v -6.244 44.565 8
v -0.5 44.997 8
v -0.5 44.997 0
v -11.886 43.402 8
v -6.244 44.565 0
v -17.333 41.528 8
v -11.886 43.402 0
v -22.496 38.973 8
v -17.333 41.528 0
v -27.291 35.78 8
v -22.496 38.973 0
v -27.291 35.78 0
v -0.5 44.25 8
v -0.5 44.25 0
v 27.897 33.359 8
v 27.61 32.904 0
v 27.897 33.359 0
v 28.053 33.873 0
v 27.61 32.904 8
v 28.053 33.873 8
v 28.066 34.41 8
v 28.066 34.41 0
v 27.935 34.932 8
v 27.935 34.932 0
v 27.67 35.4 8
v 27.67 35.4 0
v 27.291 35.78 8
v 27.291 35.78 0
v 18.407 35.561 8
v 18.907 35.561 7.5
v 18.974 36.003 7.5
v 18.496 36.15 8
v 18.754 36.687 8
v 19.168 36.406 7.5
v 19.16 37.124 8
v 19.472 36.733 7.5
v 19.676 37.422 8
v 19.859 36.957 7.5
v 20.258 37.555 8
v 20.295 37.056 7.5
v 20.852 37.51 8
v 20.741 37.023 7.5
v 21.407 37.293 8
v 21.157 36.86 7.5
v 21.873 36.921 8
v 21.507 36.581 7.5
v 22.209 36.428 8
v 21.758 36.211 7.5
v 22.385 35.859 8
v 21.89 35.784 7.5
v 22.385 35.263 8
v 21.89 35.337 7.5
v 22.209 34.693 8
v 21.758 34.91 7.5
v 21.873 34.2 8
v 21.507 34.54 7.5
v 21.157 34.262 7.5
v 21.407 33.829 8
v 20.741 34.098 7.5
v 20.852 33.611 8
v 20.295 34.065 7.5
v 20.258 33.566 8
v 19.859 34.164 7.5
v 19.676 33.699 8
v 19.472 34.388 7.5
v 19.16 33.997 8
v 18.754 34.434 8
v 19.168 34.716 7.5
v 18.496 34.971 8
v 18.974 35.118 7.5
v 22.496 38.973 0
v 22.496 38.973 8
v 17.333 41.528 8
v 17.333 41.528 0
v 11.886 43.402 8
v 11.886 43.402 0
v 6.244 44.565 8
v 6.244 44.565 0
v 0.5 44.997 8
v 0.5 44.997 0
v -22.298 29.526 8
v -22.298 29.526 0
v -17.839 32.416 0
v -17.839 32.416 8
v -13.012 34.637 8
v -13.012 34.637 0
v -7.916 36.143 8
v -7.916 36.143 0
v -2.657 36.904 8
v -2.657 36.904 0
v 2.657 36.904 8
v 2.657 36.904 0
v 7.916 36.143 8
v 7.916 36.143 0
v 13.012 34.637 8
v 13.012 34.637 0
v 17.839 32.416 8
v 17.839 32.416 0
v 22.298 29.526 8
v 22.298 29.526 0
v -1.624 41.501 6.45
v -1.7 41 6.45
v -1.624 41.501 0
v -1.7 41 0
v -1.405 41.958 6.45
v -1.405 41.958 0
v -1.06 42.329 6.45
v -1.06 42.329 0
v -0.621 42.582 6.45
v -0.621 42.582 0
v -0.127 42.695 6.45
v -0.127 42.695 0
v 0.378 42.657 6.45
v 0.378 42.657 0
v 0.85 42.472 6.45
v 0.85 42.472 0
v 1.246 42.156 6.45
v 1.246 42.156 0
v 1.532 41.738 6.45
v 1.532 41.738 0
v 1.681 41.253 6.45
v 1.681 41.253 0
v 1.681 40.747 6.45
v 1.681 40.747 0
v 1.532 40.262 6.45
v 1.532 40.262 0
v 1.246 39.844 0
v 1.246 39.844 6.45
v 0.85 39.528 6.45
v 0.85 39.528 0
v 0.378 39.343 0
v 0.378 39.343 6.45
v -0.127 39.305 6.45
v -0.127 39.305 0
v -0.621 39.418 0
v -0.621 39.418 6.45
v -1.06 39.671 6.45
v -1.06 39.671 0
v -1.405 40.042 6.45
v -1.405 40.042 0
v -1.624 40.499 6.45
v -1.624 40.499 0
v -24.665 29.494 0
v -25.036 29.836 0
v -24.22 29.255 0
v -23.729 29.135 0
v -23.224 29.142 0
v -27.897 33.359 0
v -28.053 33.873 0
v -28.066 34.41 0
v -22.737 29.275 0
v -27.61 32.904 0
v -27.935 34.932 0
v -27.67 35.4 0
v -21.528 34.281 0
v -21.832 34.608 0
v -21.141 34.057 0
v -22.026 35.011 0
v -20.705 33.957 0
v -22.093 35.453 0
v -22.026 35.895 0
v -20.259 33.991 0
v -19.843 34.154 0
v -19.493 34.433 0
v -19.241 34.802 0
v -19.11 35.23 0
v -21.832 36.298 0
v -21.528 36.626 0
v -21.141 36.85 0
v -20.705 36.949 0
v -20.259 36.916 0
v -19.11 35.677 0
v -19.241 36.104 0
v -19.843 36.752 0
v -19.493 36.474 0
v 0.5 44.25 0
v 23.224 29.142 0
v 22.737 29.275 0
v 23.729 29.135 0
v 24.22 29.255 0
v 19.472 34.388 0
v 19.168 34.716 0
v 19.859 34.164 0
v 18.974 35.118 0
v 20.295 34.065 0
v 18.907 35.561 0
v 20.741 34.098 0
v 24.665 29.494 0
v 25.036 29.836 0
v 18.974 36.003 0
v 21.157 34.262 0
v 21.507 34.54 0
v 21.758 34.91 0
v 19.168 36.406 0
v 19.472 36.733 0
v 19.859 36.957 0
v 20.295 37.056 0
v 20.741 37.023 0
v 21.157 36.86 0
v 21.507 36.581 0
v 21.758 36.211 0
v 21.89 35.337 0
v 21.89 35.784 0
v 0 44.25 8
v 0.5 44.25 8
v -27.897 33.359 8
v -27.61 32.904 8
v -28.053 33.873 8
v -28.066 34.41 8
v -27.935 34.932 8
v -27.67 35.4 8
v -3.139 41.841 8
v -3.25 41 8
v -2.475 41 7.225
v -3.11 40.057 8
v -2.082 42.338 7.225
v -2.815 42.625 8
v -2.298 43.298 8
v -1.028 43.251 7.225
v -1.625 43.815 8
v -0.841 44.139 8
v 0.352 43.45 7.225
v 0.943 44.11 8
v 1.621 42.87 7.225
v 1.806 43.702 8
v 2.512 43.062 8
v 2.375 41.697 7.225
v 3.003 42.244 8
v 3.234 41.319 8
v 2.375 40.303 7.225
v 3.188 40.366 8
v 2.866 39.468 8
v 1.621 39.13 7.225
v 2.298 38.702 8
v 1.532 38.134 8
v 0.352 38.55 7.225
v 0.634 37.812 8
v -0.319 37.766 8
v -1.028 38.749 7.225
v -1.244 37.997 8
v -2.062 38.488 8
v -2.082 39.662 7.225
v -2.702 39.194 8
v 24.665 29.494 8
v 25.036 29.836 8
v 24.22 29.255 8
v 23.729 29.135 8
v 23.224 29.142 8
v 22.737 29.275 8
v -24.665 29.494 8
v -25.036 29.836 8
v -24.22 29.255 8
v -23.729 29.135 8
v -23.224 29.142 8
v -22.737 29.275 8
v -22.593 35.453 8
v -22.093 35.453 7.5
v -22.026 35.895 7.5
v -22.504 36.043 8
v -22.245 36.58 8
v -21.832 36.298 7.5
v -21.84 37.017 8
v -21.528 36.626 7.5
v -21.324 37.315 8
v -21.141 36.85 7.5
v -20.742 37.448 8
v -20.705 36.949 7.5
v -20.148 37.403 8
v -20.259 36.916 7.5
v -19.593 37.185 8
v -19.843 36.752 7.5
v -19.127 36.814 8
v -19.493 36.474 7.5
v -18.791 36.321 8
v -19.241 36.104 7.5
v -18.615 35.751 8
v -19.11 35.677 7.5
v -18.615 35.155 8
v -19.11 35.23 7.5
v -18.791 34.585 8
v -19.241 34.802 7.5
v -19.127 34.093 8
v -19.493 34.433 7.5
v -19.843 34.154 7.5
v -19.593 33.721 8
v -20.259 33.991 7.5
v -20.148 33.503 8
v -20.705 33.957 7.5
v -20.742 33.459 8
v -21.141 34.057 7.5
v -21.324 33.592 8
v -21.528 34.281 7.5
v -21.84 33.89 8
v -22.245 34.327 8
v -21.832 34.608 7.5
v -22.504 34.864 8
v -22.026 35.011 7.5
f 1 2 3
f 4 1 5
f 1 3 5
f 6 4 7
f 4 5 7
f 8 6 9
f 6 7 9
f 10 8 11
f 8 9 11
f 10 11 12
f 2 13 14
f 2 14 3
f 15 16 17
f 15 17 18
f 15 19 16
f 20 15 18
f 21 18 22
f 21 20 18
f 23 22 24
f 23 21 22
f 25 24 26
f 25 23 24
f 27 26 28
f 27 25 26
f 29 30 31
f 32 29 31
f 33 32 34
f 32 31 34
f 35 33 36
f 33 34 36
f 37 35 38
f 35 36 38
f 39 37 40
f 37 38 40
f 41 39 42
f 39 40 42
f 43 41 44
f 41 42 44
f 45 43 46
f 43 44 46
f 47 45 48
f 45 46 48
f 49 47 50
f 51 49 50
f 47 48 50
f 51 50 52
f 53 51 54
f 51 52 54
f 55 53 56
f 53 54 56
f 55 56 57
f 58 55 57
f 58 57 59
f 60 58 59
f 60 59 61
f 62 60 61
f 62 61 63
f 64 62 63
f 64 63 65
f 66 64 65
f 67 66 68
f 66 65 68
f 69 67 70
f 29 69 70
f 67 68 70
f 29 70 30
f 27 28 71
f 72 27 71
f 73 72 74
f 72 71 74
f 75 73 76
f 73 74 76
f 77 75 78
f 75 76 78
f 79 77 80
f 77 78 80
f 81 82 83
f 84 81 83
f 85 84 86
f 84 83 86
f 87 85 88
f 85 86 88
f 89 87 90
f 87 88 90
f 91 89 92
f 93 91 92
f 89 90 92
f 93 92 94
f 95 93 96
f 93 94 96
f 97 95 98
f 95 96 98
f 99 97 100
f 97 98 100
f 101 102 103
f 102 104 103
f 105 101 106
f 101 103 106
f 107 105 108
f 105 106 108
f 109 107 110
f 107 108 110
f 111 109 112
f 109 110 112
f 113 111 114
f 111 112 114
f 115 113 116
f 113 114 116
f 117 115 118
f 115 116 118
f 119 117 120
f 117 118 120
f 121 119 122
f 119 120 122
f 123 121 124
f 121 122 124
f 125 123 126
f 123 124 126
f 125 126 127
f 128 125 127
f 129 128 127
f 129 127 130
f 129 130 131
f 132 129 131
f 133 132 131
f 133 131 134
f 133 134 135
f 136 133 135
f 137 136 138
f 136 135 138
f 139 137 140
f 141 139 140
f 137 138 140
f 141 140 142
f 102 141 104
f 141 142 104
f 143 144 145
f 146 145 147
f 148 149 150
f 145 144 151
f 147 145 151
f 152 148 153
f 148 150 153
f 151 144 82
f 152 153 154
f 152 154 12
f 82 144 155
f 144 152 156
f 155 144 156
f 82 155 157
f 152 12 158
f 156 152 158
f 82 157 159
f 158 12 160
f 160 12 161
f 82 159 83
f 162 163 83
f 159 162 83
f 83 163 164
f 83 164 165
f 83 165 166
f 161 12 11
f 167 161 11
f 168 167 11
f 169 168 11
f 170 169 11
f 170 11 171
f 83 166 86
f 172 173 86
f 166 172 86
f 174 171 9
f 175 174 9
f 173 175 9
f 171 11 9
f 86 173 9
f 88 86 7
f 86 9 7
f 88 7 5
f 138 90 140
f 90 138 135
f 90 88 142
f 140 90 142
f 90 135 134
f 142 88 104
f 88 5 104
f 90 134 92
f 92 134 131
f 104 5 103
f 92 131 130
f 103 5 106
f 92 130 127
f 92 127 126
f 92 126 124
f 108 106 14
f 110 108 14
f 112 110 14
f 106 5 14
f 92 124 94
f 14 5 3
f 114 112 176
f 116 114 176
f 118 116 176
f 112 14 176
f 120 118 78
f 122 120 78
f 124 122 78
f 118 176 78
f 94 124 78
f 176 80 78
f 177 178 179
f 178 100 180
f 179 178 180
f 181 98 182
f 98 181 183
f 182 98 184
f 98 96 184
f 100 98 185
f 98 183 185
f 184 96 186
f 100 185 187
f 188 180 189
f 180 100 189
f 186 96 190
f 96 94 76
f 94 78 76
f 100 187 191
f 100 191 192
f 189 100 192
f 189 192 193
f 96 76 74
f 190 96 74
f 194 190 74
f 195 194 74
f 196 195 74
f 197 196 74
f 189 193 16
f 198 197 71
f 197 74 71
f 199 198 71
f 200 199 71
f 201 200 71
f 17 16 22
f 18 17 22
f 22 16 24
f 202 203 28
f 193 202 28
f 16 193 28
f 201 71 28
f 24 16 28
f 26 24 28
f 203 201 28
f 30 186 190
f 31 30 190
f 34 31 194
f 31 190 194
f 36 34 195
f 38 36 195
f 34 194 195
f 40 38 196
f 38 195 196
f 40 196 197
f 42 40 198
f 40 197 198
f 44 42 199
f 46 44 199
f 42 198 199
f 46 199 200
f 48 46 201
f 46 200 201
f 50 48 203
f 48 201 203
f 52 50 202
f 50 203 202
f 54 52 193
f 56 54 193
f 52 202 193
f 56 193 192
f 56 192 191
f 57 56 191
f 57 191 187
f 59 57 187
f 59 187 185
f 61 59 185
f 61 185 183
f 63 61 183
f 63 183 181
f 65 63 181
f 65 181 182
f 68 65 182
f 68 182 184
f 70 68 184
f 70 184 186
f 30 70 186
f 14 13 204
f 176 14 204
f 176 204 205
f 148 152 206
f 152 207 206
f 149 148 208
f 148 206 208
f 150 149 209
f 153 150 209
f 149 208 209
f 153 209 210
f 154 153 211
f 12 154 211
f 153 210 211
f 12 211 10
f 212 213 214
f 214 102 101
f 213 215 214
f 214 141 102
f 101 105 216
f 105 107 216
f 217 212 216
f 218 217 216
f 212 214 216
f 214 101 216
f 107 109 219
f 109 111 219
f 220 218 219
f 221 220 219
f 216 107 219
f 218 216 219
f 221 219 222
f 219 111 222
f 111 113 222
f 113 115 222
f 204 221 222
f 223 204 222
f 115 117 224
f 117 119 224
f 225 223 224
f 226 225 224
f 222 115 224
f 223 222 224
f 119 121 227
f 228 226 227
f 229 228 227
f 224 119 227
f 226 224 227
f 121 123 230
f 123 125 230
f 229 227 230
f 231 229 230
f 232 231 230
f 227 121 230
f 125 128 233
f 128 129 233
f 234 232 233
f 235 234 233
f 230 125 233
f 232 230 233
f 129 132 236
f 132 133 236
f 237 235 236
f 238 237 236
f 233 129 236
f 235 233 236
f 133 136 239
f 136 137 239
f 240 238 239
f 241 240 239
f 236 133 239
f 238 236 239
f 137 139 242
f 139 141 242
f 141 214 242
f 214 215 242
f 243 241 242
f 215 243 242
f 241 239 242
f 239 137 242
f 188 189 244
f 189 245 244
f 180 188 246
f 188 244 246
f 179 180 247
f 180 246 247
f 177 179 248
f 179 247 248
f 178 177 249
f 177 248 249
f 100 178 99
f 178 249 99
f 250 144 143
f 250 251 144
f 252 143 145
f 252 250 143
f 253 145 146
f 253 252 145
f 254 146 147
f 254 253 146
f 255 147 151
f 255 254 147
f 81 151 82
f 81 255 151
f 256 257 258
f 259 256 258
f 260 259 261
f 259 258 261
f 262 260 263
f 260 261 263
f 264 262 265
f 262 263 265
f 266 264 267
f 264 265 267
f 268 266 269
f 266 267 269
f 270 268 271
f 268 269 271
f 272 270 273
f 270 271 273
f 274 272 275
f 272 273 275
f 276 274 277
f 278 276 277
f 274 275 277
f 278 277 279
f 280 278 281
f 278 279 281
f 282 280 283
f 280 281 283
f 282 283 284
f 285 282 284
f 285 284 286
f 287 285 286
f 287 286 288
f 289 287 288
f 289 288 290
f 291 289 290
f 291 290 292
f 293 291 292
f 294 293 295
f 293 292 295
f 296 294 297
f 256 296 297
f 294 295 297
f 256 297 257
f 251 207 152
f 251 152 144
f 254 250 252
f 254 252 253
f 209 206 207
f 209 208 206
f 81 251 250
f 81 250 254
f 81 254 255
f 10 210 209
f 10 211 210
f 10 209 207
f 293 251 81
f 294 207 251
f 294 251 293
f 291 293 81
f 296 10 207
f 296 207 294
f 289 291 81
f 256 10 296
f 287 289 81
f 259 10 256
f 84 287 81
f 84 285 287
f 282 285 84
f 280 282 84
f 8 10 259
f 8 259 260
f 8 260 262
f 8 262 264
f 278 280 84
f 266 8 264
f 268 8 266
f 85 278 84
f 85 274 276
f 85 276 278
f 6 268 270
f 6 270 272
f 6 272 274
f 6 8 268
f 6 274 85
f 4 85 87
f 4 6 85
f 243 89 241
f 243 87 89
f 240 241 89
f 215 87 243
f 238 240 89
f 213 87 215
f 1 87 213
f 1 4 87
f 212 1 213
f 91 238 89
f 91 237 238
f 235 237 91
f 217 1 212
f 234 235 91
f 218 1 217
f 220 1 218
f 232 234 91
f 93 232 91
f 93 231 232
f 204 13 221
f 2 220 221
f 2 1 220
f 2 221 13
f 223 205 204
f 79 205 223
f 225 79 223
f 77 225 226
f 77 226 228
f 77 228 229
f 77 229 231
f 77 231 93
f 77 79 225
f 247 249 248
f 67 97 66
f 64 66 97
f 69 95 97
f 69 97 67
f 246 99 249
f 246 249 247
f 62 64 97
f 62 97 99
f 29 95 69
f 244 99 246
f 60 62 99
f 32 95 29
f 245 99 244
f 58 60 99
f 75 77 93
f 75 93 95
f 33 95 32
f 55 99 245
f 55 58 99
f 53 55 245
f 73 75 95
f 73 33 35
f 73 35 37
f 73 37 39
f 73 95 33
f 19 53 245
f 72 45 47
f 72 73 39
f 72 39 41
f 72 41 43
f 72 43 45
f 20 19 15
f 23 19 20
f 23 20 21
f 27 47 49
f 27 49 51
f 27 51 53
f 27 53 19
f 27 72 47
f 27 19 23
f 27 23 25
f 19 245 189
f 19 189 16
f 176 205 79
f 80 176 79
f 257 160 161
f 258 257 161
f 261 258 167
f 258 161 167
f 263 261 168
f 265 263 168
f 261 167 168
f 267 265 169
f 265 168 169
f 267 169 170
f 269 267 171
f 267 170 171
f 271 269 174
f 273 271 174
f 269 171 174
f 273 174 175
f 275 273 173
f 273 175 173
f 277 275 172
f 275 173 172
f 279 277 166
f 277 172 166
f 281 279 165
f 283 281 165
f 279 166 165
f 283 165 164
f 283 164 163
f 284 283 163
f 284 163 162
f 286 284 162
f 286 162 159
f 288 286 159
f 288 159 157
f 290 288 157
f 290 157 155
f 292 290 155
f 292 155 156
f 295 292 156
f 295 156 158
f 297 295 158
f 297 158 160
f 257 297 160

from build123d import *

# Parameters (mm, degrees)
EXTRUDE_1_DEPTH           = 8
HOLE_WIZARD_1_D           = 3.4
HOLE_WIZARD_1_DEPTH       = 10
HOLE_WIZARD_1_CSINK_D     = 6.5
HOLE_WIZARD_1_CSINK_ANGLE = 90
HOLE_WIZARD_1_TIP         = 1.021463052
FILLET_1_R                = 2
MM_2_D                    = 3
CHAMFER_1_SIZE            = 0.5
SKETCH_7_W                = 1
SKETCH_7_H                = 1.5
CUT_EXTRUDE_1_DEPTH       = 54.641089712


with BuildPart() as part:
    # 草图1 → 凸台-拉伸1 (new body)
    with BuildSketch(Plane.XY):
        with BuildLine():
            Line((-28.925442436, 34.47199994), (-23.783141558, 28.343644395))
            ThreePointArc((-23.783141558, 28.343644395), (0, 37), (23.783141558, 28.343644395))
            Line((23.783141558, 28.343644395), (28.925442436, 34.47199994))
            ThreePointArc((28.925442436, 34.47199994), (0, 45), (-28.925442436, 34.47199994))
        make_face()
    extrude(amount=EXTRUDE_1_DEPTH)

    # 打孔尺寸(%根据)内六角花形半沉头螺钉的类型1
    with Locations(Plane.XY.offset(8)):
        with Locations((0, 41)):
            CounterSinkHole(HOLE_WIZARD_1_D / 2, HOLE_WIZARD_1_CSINK_D / 2, depth=HOLE_WIZARD_1_DEPTH, counter_sink_angle=HOLE_WIZARD_1_CSINK_ANGLE)
            with Locations((0, 0, -(HOLE_WIZARD_1_DEPTH + HOLE_WIZARD_1_TIP / 2))):  # 118° drill point
                Cone(0, HOLE_WIZARD_1_D / 2, HOLE_WIZARD_1_TIP, mode=Mode.SUBTRACT)

    # 圆角1
    fillet_1_edges = [part.edges().sort_by_distance(p)[0] for p in [
        (-23.783141558, 28.343644395, 4),
        (-28.925442436, 34.47199994, 4),
        (28.925442436, 34.47199994, 4),
        (23.783141558, 28.343644395, 4),
    ]]
    fillet(fillet_1_edges, radius=FILLET_1_R)

    # 大小mm 暗销孔2 (through all)
    with Locations(Plane.XY.offset(8)):
        with Locations((20.406972636, 35.560588688), (-20.592886859, 35.453251061)):
            Hole(MM_2_D / 2)

    # 倒角1
    chamfer_1_edges = [part.edges().sort_by_distance(p)[0] for p in [
        (21.906972636, 35.560588688, 8),
        (-19.092886859, 35.453251061, 8),
    ]]
    chamfer(chamfer_1_edges, length=CHAMFER_1_SIZE)

    # 草图7 → 切除-拉伸1 (cut, through all)
    with BuildSketch(Plane.XY.offset(8)):
        with Locations((0, 45)):
            Rectangle(SKETCH_7_W, SKETCH_7_H)
    extrude(amount=-CUT_EXTRUDE_1_DEPTH, mode=Mode.SUBTRACT)


solid = part.part
